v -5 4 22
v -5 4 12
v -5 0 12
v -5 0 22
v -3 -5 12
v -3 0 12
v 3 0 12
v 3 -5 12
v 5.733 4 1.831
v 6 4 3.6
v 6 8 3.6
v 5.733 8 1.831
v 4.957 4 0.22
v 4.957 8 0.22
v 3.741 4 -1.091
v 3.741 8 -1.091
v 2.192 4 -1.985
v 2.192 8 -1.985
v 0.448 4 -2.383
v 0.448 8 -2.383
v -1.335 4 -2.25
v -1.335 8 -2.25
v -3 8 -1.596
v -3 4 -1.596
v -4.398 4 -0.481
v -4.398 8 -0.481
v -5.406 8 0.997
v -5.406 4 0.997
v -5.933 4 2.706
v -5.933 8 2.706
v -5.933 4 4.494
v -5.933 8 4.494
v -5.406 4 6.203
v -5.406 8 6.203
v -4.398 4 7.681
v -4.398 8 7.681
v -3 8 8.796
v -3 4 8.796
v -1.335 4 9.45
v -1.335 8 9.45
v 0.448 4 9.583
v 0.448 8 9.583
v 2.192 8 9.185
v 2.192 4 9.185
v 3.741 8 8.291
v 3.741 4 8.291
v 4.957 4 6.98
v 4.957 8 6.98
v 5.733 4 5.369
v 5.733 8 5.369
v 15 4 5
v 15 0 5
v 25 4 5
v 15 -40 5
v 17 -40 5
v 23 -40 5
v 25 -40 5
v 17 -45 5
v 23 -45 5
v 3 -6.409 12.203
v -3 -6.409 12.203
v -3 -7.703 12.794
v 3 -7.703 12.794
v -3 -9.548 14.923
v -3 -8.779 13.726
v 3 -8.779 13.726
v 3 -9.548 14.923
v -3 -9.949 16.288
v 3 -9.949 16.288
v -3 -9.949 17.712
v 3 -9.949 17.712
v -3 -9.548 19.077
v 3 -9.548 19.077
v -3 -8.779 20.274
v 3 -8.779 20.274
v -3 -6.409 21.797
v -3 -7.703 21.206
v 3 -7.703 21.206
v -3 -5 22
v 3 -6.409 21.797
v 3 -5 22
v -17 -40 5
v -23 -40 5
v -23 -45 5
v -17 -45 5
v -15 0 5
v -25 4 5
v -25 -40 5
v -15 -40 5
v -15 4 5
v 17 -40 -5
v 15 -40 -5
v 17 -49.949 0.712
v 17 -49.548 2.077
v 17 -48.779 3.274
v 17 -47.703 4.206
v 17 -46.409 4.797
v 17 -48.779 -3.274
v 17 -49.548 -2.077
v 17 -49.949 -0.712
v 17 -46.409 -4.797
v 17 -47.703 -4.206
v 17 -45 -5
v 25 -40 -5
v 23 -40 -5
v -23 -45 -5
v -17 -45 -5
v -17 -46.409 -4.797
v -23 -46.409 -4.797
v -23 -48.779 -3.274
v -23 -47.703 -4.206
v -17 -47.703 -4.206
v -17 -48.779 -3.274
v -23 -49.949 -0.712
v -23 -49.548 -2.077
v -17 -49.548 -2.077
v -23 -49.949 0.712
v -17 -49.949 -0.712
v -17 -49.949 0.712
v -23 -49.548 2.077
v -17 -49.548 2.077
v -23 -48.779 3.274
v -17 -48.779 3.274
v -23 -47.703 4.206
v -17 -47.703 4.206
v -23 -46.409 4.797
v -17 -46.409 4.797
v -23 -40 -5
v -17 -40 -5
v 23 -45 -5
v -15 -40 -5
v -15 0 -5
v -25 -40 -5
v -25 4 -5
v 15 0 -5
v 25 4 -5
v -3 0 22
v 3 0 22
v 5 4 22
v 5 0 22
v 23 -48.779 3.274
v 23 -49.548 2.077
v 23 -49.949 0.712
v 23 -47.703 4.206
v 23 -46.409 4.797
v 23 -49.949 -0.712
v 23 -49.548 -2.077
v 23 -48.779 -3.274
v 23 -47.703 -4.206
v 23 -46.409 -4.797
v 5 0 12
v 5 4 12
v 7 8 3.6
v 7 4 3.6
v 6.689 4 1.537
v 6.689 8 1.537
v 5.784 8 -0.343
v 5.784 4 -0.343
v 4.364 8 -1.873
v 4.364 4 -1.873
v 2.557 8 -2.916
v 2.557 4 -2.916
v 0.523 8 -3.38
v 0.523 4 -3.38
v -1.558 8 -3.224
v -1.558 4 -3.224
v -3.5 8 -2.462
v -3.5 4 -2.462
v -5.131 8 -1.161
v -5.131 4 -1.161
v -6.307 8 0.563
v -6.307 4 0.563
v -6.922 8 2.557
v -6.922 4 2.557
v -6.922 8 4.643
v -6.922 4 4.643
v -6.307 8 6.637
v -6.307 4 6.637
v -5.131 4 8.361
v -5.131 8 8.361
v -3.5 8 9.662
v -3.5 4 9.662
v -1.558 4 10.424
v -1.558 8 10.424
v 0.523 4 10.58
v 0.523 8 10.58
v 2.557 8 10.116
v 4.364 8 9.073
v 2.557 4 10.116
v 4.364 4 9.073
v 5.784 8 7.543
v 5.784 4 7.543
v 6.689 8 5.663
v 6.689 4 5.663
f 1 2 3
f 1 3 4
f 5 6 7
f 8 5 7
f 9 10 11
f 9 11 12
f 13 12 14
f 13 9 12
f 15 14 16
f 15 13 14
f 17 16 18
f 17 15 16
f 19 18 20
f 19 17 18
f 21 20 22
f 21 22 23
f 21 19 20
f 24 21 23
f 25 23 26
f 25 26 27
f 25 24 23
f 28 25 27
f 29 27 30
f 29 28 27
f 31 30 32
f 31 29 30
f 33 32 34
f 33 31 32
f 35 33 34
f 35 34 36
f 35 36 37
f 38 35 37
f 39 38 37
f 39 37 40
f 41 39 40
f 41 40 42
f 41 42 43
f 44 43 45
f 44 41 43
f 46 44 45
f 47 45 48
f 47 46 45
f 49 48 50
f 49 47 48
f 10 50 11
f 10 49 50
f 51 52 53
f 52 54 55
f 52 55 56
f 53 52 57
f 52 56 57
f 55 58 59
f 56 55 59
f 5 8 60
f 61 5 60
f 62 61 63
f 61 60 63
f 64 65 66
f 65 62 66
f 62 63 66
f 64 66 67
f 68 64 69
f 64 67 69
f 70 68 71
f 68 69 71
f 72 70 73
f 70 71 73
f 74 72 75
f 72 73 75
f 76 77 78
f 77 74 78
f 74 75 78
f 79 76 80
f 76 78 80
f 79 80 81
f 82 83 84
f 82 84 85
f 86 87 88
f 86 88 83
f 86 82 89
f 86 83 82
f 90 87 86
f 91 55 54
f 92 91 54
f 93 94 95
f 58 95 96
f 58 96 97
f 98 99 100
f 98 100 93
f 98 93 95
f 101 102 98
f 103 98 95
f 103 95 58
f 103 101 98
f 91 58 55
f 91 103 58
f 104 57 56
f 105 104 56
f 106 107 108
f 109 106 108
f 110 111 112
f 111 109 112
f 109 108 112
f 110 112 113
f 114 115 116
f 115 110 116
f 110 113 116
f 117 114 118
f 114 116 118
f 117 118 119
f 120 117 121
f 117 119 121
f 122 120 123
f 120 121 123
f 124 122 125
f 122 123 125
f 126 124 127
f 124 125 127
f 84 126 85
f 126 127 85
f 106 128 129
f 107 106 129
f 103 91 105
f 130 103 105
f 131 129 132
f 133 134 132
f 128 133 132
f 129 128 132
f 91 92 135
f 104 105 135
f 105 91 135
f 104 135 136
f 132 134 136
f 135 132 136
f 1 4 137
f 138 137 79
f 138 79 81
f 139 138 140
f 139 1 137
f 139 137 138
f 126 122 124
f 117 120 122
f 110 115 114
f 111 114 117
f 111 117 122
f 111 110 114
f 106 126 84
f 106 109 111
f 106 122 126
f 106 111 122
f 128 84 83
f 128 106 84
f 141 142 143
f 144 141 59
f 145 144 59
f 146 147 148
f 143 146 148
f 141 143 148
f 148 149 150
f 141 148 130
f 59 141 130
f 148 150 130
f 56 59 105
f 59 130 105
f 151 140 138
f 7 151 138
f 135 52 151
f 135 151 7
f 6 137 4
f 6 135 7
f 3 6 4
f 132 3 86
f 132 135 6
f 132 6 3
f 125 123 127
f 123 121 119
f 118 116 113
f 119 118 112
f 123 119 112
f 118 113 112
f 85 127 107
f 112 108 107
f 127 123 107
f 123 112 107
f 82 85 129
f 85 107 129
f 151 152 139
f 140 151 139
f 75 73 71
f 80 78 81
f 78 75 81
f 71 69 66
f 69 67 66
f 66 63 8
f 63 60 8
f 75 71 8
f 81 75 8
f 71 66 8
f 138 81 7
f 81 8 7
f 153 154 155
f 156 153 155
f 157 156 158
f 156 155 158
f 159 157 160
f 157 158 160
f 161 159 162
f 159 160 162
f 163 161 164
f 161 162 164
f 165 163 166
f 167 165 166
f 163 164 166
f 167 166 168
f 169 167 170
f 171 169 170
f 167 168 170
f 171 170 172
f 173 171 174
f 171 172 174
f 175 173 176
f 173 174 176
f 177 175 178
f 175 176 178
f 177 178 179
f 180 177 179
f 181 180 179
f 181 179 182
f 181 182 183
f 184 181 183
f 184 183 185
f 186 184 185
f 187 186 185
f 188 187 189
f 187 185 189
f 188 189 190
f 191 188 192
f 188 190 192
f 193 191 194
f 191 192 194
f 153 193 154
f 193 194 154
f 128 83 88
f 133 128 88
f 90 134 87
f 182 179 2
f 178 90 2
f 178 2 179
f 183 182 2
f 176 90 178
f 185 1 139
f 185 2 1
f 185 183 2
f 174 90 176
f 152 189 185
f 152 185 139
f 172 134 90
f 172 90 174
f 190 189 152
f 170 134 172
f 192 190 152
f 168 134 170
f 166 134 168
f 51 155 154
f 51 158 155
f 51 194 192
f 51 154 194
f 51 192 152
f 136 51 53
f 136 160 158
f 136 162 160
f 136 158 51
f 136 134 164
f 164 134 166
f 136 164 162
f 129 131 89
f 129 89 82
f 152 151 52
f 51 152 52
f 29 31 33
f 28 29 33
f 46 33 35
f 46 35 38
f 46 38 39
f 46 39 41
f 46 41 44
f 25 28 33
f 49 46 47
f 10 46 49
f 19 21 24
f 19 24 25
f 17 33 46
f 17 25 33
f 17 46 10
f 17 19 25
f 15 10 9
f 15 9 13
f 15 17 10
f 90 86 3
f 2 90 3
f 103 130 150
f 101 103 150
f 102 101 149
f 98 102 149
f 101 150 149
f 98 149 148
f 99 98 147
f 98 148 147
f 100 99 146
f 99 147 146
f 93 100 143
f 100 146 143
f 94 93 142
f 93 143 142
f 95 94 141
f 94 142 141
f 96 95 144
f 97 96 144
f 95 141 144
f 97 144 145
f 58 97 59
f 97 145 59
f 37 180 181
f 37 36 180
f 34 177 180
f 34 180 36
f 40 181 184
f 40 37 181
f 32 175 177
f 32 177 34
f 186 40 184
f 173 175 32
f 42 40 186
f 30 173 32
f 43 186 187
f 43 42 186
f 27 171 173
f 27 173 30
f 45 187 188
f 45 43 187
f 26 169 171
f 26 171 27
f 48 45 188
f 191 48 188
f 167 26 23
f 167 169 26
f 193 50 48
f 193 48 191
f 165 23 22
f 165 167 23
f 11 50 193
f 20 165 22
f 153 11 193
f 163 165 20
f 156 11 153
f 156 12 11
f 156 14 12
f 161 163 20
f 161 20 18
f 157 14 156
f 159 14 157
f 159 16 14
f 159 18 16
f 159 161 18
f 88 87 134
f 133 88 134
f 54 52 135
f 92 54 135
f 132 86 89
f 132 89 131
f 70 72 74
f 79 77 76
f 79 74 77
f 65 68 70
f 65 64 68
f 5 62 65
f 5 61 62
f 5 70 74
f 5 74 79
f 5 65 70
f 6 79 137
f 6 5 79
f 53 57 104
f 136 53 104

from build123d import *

# Parameters (mm, degrees)
EXTRUDE_1_DEPTH     = 4
SKETCH_1_W          = 10
SKETCH_1_H          = 10
EXTRUDE_2_DEPTH     = 50
SKETCH_6_W          = 10
SKETCH_6_H          = 10
EXTRUDE_4_DEPTH     = 10
SKETCH_7_W          = 2
SKETCH_7_H          = 10
SKETCH_7_W_2        = 4.928830328
SKETCH_7_W_3        = 5.69296793
SKETCH_7_W_4        = 34
CUT_EXTRUDE_3_DEPTH = 28
CUT_EXTRUDE_4_DEPTH = 51
SKETCH_9_R          = 7
SKETCH_9_R_2        = 6
EXTRUDE_5_DEPTH     = 4


with BuildPart() as part:
    # 草图2 → 凸台-拉伸1 (new body)
    with BuildSketch(Plane(origin=(0, 0, 0), x_dir=(1, 0, 0), z_dir=(0, 1, 0))):
        Polygon((-5, -22), (5, -22), (5, -12), (15, -5), (25, -5), (25, 5), (-25, 5), (-25, -5), (-15, -5), (-5, -12), align=None)
    extrude(amount=EXTRUDE_1_DEPTH)

    # 草图1 → 凸台-拉伸2 (add)
    with BuildSketch(Plane(origin=(0, 0, 0), x_dir=(1, 0, 0), z_dir=(0, 1, 0))):
        with Locations((-20, 0)):
            Rectangle(SKETCH_1_W, SKETCH_1_H)
        with Locations((20, 0)):
            Rectangle(SKETCH_1_W, SKETCH_1_H)
    extrude(amount=-EXTRUDE_2_DEPTH)

    # 草图6 → 凸台-拉伸4 (add)
    with BuildSketch(Plane.XZ):
        with Locations((0, 17)):
            Rectangle(SKETCH_6_W, SKETCH_6_H)
    extrude(amount=EXTRUDE_4_DEPTH)

    # 草图7 → 切除-拉伸3 (cut, through all)
    with BuildSketch(Plane(origin=(0, 0, -5), x_dir=(-1, 0, 0), z_dir=(0, 0, -1))):
        with Locations((-24, -45)):
            Rectangle(SKETCH_7_W, SKETCH_7_H)
        with Locations((24, -45)):
            Rectangle(SKETCH_7_W, SKETCH_7_H)
        with Locations((-5.464415164, -5)):
            Rectangle(SKETCH_7_W_2, SKETCH_7_H)
        with Locations((5.846483965, -5)):
            Rectangle(SKETCH_7_W_3, SKETCH_7_H)
        with Locations((0, -45)):
            Rectangle(SKETCH_7_W_4, SKETCH_7_H)
    extrude(amount=-CUT_EXTRUDE_3_DEPTH, mode=Mode.SUBTRACT)

    # 草图8 → 切除-拉伸4 (cut, through all)
    with BuildSketch(Plane(origin=(25, 0, 0), x_dir=(0, 0, -1), z_dir=(1, 0, 0))):
        with BuildLine():
            Line((-22, -5), (-22, -14.409566658))
            Line((-22, -14.409566658), (-12, -14.409566658))
            Line((-12, -14.409566658), (-12, -5))
            ThreePointArc((-12, -5), (-17, -10), (-22, -5))
        make_face()
        with BuildLine():
            Line((-5, -45), (-5, -53.480862615))
            Line((-5, -53.480862615), (5, -53.480862615))
            Line((5, -53.480862615), (5, -45))
            ThreePointArc((5, -45), (0, -50), (-5, -45))
        make_face()
    extrude(amount=-CUT_EXTRUDE_4_DEPTH, mode=Mode.SUBTRACT)

    # 草图9 → 凸台-拉伸5 (add)
    with BuildSketch(Plane(origin=(0, 4, 0), x_dir=(1, 0, 0), z_dir=(0, 1, 0))):
        with Locations((0, -3.6)):
            Circle(SKETCH_9_R)
        with Locations((0, -3.6)):
            Circle(SKETCH_9_R_2, mode=Mode.SUBTRACT)
    extrude(amount=EXTRUDE_5_DEPTH)


solid = part.part
